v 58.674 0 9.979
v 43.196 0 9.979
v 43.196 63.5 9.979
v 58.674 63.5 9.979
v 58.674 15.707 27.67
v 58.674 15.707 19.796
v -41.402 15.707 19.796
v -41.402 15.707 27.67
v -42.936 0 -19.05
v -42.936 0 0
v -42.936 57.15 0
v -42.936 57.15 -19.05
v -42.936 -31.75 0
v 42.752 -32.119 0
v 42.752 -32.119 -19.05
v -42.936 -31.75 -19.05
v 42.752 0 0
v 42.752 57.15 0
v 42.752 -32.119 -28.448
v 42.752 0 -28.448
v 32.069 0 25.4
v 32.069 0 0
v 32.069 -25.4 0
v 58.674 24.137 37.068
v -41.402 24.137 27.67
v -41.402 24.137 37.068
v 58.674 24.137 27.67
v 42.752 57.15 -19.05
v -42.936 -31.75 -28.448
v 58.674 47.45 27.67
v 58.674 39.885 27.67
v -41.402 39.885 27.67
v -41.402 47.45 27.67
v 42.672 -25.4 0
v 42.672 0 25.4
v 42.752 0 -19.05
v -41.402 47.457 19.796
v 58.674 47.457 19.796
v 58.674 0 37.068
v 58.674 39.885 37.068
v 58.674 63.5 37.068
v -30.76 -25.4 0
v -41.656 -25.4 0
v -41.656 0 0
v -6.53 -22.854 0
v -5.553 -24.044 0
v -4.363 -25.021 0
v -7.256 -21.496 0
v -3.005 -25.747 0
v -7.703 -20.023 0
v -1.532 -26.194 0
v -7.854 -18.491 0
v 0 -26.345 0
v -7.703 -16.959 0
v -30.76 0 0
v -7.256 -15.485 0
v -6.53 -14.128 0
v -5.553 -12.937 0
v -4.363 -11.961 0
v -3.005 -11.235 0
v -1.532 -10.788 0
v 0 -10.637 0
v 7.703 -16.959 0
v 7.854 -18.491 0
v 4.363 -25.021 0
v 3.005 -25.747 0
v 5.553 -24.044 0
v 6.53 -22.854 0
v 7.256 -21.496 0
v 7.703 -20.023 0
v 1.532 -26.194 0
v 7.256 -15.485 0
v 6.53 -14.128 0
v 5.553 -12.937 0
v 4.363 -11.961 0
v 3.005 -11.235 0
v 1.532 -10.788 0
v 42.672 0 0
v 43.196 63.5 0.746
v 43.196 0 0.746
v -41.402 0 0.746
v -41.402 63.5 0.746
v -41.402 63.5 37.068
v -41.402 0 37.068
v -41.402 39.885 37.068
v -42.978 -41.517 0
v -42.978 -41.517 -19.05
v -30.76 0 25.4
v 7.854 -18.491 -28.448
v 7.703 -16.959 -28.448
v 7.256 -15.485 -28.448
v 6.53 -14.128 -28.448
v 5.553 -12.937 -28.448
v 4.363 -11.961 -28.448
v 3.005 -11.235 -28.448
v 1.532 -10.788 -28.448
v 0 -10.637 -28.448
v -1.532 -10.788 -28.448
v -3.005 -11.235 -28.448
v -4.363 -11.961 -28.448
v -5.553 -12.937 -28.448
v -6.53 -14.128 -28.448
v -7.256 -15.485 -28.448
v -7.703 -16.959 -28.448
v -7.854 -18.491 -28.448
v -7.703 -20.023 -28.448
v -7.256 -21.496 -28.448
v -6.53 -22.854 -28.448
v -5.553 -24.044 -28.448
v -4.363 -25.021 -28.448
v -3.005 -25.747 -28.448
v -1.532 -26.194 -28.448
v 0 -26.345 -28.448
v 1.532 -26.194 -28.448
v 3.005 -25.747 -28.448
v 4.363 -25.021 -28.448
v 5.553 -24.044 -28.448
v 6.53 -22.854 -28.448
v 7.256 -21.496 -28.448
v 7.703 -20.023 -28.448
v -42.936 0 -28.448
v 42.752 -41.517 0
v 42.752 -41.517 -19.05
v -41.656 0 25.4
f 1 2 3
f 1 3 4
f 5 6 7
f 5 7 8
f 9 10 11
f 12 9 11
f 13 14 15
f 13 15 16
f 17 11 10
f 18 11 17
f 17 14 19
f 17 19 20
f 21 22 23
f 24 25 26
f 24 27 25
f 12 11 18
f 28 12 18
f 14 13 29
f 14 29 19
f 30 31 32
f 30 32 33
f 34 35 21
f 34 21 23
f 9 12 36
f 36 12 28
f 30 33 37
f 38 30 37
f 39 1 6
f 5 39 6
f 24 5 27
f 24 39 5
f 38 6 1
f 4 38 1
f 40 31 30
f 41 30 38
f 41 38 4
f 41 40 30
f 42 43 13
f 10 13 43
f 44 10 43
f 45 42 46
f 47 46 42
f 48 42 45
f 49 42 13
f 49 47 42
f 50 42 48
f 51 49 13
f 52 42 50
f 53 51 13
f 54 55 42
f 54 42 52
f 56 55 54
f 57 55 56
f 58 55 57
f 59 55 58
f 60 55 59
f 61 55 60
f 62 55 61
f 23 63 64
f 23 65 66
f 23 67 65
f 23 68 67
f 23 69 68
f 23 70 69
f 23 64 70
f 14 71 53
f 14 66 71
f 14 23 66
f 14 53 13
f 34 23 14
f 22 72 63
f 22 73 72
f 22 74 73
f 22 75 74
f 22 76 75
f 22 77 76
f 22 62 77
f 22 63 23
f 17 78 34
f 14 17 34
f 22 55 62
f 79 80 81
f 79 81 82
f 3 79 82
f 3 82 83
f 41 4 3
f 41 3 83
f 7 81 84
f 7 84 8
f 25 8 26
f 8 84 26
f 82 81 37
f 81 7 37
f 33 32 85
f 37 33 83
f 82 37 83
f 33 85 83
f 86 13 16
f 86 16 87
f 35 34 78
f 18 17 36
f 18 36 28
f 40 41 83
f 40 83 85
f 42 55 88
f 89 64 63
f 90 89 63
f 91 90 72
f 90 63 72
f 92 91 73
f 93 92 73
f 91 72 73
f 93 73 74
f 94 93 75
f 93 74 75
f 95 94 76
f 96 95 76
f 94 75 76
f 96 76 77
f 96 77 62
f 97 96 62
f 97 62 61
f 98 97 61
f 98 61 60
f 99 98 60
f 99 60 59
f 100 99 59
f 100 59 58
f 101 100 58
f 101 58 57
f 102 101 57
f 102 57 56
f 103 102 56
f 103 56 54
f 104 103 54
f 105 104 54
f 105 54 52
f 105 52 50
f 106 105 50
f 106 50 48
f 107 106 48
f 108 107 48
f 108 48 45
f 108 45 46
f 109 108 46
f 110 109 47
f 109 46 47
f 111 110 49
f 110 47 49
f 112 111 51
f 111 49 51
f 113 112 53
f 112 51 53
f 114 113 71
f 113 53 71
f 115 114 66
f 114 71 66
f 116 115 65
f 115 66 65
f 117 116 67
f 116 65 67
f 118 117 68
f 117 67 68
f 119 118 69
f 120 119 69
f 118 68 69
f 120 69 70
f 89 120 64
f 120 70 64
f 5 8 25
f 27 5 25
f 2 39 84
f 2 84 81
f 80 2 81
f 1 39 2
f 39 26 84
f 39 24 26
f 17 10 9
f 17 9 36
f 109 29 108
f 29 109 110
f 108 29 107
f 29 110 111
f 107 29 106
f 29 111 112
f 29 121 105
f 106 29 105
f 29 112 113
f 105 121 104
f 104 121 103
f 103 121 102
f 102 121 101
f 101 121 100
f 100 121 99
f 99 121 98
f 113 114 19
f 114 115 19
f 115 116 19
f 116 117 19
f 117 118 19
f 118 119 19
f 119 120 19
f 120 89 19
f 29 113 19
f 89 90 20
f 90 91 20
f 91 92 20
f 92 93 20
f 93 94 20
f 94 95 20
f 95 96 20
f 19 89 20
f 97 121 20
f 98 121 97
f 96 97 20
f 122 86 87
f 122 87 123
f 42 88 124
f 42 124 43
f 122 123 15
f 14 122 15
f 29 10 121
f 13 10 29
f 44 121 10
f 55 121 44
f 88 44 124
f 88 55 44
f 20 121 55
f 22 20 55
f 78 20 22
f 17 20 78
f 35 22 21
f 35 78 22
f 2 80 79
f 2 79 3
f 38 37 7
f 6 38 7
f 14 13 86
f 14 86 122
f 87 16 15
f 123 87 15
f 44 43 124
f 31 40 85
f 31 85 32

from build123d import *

# Parameters (mm, degrees)
F0_W           = 85.6876475524
F0_H           = 57.15
F1_DEPTH       = 19.05
F2_DEPTH       = 19.05
F3_DEPTH       = 28.448
F5_DEPTH       = 42.672
F5_DEPTH_BACK  = 41.656
F6_W           = 62.8299433738
F6_H           = 26.9953813404
F7_DEPTH       = 187.452
F9_DEPTH       = 58.674
F9_DEPTH_BACK  = 41.402
F10_W          = 17.01644063
F10_H          = 9.9789379165
F11_DEPTH      = 129.286
F12_R          = 7.8537426889
F13_DEPTH      = 60.706
F13_DEPTH_BACK = 80.518


with BuildPart() as f1:
    # F0 (on Top) → F1 (new body)
    with BuildSketch(Plane.XY):
        with Locations((-0.0921365968, 28.575)):
            Rectangle(F0_W, F0_H)
    extrude(amount=-F1_DEPTH)


with BuildPart() as f2:
    # F0 (on Top) → F2 (new body)
    with BuildSketch(Plane.XY):
        Polygon((42.7516871794, -32.1185484849), (-42.935960373, -31.75), (-42.9779669719, -41.5165484849), (42.7516871794, -41.5165484849), align=None)
    extrude(amount=-F2_DEPTH)


with BuildPart() as f3:
    # F0 (on Top) → F3 (new body)
    with BuildSketch(Plane.XY):
        Polygon((42.7516871794, 0), (-42.935960373, 0), (-42.935960373, -31.75), (42.7516871794, -32.1185484849), align=None)
    extrude(amount=-F3_DEPTH)

    # F4 (on Right) → F5 (join, two sides)
    with BuildSketch(Plane.YZ) as f5_sk:
        Polygon((-25.4, 0), (0, 0), (0, 25.4), align=None)
    extrude(amount=F5_DEPTH)
    extrude(f5_sk.sketch, amount=-F5_DEPTH_BACK)

    # F6 (on Front) → F7 (cut)
    with BuildSketch(Plane.XZ):
        with Locations((0.6544804201, 13.4976906702)):
            Rectangle(F6_W, F6_H)
    extrude(amount=F7_DEPTH, mode=Mode.SUBTRACT)

    # F12 (on Top) → F13 (cut, two sides)
    with BuildSketch(Plane.XY) as f13_sk:
        with Locations((0, -18.4908788651)):
            Circle(F12_R)
    extrude(amount=F13_DEPTH, mode=Mode.SUBTRACT)
    extrude(f13_sk.sketch, amount=-F13_DEPTH_BACK, mode=Mode.SUBTRACT)


with BuildPart() as f9:
    # F8 (on Right) → F9 (new body, two sides)
    with BuildSketch(Plane.YZ) as f9_sk:
        Polygon((0, 37.0681124274), (0, 0.7461162776), (63.5, 0.7461162776), (63.5, 37.0681124274), (39.8853512744, 37.0681124274), (39.8853512744, 27.6701124274), (47.4496930838, 27.6701124274), (47.4574797899, 19.7961162776), (15.7074797899, 19.7961162776), (15.7074797899, 27.6701124274), (24.1373512744, 27.6701124274), (24.1373512744, 37.0681124274), align=None)
    extrude(amount=F9_DEPTH)
    extrude(f9_sk.sketch, amount=-F9_DEPTH_BACK)

    # F10 (on Front) → F11 (cut)
    with BuildSketch(Plane.XZ):
        with Locations((51.703799516, 4.9894689582)):
            Rectangle(F10_W, F10_H)
    extrude(amount=-F11_DEPTH, mode=Mode.SUBTRACT)


solid = Compound([f1.part, f2.part, f3.part, f9.part])
